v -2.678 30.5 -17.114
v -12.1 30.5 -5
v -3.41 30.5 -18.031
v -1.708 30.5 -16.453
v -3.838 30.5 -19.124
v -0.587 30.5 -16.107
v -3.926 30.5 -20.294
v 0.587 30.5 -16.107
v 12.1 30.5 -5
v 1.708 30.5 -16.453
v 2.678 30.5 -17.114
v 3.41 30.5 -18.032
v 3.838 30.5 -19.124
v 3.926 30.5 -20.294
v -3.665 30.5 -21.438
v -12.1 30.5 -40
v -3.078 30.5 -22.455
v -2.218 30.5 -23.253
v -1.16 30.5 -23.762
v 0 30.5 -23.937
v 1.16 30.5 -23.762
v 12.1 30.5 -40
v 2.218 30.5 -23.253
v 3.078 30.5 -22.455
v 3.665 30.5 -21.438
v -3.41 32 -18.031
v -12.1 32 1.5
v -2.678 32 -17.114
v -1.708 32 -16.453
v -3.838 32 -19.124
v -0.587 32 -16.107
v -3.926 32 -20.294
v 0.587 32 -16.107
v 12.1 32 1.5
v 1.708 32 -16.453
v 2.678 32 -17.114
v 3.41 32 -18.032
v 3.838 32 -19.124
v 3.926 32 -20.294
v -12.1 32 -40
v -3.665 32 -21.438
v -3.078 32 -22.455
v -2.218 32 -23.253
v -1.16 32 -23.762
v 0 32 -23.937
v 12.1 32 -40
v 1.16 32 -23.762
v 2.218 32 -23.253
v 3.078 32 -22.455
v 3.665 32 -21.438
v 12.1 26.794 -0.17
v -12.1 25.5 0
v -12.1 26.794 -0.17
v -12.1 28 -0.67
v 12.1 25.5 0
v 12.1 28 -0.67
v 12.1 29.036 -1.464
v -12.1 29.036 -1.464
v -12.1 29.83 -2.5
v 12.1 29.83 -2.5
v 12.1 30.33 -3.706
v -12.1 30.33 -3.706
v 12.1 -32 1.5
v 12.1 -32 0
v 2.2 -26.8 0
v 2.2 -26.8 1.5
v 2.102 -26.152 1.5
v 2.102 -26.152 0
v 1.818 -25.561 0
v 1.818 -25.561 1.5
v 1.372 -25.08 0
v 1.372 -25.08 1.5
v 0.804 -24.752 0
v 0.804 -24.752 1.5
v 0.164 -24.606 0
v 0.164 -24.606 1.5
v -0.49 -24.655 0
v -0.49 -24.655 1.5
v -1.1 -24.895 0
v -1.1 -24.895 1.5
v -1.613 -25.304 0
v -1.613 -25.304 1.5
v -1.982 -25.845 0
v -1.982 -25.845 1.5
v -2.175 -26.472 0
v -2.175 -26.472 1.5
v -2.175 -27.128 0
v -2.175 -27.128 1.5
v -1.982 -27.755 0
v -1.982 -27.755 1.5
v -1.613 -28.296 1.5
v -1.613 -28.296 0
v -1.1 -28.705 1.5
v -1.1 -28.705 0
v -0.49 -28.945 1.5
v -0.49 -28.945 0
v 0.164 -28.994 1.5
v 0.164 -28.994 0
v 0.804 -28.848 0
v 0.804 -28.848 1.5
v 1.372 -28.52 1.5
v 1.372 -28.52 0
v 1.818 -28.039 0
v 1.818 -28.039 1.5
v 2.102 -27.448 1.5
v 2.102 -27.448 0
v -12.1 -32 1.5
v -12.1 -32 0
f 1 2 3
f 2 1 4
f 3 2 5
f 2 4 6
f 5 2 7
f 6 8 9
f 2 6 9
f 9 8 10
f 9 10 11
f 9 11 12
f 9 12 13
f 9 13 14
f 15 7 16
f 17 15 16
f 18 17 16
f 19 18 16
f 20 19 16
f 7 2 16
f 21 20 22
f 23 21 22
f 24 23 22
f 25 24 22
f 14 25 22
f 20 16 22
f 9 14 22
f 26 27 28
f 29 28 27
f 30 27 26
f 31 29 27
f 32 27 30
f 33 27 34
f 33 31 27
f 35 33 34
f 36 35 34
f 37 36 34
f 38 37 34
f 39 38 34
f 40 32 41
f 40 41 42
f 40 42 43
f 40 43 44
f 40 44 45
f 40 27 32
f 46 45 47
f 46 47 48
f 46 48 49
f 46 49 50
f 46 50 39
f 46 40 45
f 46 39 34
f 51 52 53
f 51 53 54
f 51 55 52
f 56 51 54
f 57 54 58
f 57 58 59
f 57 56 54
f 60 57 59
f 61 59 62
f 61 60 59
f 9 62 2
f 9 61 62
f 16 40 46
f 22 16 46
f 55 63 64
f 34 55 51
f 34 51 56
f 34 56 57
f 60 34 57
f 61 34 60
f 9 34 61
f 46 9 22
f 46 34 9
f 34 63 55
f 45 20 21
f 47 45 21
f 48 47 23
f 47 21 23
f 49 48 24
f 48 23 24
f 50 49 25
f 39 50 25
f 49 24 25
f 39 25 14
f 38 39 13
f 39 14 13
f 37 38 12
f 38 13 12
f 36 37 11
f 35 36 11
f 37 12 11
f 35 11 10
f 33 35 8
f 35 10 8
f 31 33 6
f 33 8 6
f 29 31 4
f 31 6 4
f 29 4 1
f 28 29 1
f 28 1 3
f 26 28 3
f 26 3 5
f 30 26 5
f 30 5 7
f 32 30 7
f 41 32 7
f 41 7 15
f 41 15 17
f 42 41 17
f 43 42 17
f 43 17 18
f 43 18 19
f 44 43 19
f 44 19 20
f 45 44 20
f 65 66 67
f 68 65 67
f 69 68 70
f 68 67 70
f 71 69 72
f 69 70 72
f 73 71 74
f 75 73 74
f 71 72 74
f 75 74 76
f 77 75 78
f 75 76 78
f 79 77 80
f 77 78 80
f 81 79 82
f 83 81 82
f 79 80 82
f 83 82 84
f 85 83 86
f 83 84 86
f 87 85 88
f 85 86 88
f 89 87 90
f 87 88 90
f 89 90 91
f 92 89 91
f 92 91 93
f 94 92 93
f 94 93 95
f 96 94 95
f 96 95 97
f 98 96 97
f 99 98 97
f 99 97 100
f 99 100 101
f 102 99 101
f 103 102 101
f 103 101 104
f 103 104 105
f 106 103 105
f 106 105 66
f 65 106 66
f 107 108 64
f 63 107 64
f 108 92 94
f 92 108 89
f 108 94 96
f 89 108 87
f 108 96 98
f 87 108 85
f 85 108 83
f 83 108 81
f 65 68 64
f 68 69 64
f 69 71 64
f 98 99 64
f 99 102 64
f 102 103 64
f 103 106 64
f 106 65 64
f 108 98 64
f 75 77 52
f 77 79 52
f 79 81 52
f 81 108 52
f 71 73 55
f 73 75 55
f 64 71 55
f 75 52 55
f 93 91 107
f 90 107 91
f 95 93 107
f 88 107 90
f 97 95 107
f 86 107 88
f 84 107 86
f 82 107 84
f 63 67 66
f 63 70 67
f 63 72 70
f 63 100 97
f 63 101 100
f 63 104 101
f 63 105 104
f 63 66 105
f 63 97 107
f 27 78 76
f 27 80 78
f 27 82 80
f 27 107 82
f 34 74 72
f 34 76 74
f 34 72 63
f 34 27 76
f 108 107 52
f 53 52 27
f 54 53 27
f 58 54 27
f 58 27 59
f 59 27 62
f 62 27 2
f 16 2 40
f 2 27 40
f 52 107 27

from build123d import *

# Parameters (mm, degrees)
SKETCH1_W           = 24.2
SKETCH1_H           = 64
BOSS_EXTRUDE1_DEPTH = 1.5
SKETCH2_R           = 2.2
CUT_EXTRUDE1_DEPTH  = 35.244123583
SKETCH4_W           = 24.2
SKETCH4_H           = 40
BOSS_EXTRUDE2_DEPTH = 1.5
SKETCH5_R           = 3.937
CUT_EXTRUDE2_DEPTH  = 76.184173867
FILLET1_R           = 5


with BuildPart() as part:
    # Sketch1 → Boss-Extrude1 (new body)
    with BuildSketch(Plane.XY):
        Rectangle(SKETCH1_W, SKETCH1_H)
    extrude(amount=BOSS_EXTRUDE1_DEPTH)

    # Sketch2 → Cut-Extrude1 (cut, through all)
    with BuildSketch(Plane.XY.offset(1.5)):
        with Locations((0, -26.8)):
            Circle(SKETCH2_R)
    extrude(amount=-CUT_EXTRUDE1_DEPTH, mode=Mode.SUBTRACT)

    # Sketch4 → Boss-Extrude2 (add)
    with BuildSketch(Plane(origin=(0, 32, 0), x_dir=(1, 0, 0), z_dir=(0, 1, 0))):
        with Locations((0, 20)):
            Rectangle(SKETCH4_W, SKETCH4_H)
    extrude(amount=-BOSS_EXTRUDE2_DEPTH)

    # Sketch5 → Cut-Extrude2 (cut, through all)
    with BuildSketch(Plane.XZ.offset(-30.5)):
        with Locations(Location((0, -20, 0), (0, 0, 270))):
            Circle(SKETCH5_R)
    extrude(amount=-CUT_EXTRUDE2_DEPTH, mode=Mode.SUBTRACT)

    # Fillet1
    fillet1_edges = [part.edges().sort_by_distance(p)[0] for p in [
        (0, 30.5, 0),
    ]]
    fillet(fillet1_edges, radius=FILLET1_R)


solid = part.part
